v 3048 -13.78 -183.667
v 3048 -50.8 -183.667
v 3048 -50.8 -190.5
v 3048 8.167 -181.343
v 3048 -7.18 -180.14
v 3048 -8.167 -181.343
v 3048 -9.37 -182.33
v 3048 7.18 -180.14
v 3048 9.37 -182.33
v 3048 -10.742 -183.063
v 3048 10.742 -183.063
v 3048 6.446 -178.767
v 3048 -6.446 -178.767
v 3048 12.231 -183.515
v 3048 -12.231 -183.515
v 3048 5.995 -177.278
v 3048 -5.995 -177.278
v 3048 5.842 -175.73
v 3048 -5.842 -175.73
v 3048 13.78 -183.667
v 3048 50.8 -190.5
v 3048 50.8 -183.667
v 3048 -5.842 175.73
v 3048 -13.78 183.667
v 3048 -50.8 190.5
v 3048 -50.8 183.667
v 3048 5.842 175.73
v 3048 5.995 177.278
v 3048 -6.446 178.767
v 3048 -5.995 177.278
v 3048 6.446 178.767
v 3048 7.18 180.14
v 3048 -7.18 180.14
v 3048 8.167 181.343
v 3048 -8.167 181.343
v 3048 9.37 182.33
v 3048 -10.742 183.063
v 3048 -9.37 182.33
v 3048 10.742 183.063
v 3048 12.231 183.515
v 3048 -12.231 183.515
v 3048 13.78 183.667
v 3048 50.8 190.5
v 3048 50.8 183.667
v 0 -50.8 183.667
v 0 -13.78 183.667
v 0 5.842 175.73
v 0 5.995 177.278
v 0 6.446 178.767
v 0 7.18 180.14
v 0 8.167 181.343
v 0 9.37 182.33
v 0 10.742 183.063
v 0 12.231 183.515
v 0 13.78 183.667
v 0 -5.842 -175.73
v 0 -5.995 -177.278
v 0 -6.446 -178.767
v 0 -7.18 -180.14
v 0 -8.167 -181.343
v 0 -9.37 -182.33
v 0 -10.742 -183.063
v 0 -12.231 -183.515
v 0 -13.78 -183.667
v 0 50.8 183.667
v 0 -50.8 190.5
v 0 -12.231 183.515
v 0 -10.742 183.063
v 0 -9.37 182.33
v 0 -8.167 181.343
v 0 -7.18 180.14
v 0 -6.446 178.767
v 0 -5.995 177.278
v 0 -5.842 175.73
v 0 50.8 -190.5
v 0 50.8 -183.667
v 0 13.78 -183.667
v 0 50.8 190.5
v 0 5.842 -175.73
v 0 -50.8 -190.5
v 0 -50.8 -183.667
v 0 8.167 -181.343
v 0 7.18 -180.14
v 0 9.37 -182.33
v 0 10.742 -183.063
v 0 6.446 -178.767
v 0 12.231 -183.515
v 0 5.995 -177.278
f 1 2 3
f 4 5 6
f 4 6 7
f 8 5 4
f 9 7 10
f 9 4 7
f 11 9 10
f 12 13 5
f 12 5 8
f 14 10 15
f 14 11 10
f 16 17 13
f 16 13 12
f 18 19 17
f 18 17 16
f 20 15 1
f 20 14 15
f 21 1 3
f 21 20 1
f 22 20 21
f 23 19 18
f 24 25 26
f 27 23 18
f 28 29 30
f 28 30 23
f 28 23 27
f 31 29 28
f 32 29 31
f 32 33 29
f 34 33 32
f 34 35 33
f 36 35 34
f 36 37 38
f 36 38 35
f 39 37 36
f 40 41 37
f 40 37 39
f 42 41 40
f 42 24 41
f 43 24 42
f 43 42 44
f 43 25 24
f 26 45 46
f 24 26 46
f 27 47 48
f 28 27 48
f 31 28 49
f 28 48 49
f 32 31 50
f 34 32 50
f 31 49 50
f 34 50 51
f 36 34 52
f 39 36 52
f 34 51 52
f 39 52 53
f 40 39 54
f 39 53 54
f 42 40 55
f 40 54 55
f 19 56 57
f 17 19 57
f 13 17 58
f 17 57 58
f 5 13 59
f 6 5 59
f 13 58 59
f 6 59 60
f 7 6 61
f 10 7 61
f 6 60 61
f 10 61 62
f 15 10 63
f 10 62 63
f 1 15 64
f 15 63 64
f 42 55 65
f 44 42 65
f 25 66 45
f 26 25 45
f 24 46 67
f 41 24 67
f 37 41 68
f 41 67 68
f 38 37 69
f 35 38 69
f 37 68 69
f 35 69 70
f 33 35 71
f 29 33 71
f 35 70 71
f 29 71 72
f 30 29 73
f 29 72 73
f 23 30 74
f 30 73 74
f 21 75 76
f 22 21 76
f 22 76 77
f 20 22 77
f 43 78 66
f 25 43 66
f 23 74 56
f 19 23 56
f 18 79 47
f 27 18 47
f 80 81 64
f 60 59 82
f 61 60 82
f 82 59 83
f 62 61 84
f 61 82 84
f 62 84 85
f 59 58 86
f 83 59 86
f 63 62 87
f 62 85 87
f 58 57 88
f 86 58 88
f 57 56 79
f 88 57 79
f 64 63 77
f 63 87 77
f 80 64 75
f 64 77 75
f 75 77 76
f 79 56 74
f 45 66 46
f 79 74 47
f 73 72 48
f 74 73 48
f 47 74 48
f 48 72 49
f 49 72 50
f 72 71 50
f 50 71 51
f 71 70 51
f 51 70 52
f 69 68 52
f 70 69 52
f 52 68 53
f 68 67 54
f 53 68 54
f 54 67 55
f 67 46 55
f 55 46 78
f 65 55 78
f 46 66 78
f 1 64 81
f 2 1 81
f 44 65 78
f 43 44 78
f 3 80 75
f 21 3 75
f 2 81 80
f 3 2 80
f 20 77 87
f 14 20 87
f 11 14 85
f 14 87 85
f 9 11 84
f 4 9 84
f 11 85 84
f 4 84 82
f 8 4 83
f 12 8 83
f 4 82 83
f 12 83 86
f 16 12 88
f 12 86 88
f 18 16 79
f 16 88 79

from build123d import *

# Parameters (mm, degrees)
F1_DEPTH = 3048


with BuildPart() as f1:
    # F0 (on Right) → F1 (new body)
    with BuildSketch(Plane.YZ):
        with BuildLine():
            Line((-5.842, 175.7299), (-5.842, 0))
            Line((-5.842, 0), (-5.842, -175.7299))
            ThreePointArc((-5.842, -175.7299), (-8.16684, -181.34256), (-13.7795, -183.6674))
            Line((-13.7795, -183.6674), (-50.8, -183.6674))
            Line((-50.8, -183.6674), (-50.8, -190.5))
            Line((-50.8, -190.5), (0, -190.5))
            Line((0, -190.5), (50.8, -190.5))
            Line((50.8, -190.5), (50.8, -183.6674))
            Line((50.8, -183.6674), (13.7795, -183.6674))
            ThreePointArc((13.7795, -183.6674), (8.16684, -181.34256), (5.842, -175.7299))
            Line((5.842, -175.7299), (5.842, 0))
            Line((5.842, 0), (5.842, 175.7299))
            ThreePointArc((5.842, 175.7299), (8.16684, 181.34256), (13.7795, 183.6674))
            Line((13.7795, 183.6674), (50.8, 183.6674))
            Line((50.8, 183.6674), (50.8, 190.5))
            Line((50.8, 190.5), (0, 190.5))
            Line((0, 190.5), (-50.8, 190.5))
            Line((-50.8, 190.5), (-50.8, 183.6674))
            Line((-50.8, 183.6674), (-13.7795, 183.6674))
            ThreePointArc((-13.7795, 183.6674), (-8.16684, 181.34256), (-5.842, 175.7299))
        make_face()
    extrude(amount=F1_DEPTH)


solid = f1.part
